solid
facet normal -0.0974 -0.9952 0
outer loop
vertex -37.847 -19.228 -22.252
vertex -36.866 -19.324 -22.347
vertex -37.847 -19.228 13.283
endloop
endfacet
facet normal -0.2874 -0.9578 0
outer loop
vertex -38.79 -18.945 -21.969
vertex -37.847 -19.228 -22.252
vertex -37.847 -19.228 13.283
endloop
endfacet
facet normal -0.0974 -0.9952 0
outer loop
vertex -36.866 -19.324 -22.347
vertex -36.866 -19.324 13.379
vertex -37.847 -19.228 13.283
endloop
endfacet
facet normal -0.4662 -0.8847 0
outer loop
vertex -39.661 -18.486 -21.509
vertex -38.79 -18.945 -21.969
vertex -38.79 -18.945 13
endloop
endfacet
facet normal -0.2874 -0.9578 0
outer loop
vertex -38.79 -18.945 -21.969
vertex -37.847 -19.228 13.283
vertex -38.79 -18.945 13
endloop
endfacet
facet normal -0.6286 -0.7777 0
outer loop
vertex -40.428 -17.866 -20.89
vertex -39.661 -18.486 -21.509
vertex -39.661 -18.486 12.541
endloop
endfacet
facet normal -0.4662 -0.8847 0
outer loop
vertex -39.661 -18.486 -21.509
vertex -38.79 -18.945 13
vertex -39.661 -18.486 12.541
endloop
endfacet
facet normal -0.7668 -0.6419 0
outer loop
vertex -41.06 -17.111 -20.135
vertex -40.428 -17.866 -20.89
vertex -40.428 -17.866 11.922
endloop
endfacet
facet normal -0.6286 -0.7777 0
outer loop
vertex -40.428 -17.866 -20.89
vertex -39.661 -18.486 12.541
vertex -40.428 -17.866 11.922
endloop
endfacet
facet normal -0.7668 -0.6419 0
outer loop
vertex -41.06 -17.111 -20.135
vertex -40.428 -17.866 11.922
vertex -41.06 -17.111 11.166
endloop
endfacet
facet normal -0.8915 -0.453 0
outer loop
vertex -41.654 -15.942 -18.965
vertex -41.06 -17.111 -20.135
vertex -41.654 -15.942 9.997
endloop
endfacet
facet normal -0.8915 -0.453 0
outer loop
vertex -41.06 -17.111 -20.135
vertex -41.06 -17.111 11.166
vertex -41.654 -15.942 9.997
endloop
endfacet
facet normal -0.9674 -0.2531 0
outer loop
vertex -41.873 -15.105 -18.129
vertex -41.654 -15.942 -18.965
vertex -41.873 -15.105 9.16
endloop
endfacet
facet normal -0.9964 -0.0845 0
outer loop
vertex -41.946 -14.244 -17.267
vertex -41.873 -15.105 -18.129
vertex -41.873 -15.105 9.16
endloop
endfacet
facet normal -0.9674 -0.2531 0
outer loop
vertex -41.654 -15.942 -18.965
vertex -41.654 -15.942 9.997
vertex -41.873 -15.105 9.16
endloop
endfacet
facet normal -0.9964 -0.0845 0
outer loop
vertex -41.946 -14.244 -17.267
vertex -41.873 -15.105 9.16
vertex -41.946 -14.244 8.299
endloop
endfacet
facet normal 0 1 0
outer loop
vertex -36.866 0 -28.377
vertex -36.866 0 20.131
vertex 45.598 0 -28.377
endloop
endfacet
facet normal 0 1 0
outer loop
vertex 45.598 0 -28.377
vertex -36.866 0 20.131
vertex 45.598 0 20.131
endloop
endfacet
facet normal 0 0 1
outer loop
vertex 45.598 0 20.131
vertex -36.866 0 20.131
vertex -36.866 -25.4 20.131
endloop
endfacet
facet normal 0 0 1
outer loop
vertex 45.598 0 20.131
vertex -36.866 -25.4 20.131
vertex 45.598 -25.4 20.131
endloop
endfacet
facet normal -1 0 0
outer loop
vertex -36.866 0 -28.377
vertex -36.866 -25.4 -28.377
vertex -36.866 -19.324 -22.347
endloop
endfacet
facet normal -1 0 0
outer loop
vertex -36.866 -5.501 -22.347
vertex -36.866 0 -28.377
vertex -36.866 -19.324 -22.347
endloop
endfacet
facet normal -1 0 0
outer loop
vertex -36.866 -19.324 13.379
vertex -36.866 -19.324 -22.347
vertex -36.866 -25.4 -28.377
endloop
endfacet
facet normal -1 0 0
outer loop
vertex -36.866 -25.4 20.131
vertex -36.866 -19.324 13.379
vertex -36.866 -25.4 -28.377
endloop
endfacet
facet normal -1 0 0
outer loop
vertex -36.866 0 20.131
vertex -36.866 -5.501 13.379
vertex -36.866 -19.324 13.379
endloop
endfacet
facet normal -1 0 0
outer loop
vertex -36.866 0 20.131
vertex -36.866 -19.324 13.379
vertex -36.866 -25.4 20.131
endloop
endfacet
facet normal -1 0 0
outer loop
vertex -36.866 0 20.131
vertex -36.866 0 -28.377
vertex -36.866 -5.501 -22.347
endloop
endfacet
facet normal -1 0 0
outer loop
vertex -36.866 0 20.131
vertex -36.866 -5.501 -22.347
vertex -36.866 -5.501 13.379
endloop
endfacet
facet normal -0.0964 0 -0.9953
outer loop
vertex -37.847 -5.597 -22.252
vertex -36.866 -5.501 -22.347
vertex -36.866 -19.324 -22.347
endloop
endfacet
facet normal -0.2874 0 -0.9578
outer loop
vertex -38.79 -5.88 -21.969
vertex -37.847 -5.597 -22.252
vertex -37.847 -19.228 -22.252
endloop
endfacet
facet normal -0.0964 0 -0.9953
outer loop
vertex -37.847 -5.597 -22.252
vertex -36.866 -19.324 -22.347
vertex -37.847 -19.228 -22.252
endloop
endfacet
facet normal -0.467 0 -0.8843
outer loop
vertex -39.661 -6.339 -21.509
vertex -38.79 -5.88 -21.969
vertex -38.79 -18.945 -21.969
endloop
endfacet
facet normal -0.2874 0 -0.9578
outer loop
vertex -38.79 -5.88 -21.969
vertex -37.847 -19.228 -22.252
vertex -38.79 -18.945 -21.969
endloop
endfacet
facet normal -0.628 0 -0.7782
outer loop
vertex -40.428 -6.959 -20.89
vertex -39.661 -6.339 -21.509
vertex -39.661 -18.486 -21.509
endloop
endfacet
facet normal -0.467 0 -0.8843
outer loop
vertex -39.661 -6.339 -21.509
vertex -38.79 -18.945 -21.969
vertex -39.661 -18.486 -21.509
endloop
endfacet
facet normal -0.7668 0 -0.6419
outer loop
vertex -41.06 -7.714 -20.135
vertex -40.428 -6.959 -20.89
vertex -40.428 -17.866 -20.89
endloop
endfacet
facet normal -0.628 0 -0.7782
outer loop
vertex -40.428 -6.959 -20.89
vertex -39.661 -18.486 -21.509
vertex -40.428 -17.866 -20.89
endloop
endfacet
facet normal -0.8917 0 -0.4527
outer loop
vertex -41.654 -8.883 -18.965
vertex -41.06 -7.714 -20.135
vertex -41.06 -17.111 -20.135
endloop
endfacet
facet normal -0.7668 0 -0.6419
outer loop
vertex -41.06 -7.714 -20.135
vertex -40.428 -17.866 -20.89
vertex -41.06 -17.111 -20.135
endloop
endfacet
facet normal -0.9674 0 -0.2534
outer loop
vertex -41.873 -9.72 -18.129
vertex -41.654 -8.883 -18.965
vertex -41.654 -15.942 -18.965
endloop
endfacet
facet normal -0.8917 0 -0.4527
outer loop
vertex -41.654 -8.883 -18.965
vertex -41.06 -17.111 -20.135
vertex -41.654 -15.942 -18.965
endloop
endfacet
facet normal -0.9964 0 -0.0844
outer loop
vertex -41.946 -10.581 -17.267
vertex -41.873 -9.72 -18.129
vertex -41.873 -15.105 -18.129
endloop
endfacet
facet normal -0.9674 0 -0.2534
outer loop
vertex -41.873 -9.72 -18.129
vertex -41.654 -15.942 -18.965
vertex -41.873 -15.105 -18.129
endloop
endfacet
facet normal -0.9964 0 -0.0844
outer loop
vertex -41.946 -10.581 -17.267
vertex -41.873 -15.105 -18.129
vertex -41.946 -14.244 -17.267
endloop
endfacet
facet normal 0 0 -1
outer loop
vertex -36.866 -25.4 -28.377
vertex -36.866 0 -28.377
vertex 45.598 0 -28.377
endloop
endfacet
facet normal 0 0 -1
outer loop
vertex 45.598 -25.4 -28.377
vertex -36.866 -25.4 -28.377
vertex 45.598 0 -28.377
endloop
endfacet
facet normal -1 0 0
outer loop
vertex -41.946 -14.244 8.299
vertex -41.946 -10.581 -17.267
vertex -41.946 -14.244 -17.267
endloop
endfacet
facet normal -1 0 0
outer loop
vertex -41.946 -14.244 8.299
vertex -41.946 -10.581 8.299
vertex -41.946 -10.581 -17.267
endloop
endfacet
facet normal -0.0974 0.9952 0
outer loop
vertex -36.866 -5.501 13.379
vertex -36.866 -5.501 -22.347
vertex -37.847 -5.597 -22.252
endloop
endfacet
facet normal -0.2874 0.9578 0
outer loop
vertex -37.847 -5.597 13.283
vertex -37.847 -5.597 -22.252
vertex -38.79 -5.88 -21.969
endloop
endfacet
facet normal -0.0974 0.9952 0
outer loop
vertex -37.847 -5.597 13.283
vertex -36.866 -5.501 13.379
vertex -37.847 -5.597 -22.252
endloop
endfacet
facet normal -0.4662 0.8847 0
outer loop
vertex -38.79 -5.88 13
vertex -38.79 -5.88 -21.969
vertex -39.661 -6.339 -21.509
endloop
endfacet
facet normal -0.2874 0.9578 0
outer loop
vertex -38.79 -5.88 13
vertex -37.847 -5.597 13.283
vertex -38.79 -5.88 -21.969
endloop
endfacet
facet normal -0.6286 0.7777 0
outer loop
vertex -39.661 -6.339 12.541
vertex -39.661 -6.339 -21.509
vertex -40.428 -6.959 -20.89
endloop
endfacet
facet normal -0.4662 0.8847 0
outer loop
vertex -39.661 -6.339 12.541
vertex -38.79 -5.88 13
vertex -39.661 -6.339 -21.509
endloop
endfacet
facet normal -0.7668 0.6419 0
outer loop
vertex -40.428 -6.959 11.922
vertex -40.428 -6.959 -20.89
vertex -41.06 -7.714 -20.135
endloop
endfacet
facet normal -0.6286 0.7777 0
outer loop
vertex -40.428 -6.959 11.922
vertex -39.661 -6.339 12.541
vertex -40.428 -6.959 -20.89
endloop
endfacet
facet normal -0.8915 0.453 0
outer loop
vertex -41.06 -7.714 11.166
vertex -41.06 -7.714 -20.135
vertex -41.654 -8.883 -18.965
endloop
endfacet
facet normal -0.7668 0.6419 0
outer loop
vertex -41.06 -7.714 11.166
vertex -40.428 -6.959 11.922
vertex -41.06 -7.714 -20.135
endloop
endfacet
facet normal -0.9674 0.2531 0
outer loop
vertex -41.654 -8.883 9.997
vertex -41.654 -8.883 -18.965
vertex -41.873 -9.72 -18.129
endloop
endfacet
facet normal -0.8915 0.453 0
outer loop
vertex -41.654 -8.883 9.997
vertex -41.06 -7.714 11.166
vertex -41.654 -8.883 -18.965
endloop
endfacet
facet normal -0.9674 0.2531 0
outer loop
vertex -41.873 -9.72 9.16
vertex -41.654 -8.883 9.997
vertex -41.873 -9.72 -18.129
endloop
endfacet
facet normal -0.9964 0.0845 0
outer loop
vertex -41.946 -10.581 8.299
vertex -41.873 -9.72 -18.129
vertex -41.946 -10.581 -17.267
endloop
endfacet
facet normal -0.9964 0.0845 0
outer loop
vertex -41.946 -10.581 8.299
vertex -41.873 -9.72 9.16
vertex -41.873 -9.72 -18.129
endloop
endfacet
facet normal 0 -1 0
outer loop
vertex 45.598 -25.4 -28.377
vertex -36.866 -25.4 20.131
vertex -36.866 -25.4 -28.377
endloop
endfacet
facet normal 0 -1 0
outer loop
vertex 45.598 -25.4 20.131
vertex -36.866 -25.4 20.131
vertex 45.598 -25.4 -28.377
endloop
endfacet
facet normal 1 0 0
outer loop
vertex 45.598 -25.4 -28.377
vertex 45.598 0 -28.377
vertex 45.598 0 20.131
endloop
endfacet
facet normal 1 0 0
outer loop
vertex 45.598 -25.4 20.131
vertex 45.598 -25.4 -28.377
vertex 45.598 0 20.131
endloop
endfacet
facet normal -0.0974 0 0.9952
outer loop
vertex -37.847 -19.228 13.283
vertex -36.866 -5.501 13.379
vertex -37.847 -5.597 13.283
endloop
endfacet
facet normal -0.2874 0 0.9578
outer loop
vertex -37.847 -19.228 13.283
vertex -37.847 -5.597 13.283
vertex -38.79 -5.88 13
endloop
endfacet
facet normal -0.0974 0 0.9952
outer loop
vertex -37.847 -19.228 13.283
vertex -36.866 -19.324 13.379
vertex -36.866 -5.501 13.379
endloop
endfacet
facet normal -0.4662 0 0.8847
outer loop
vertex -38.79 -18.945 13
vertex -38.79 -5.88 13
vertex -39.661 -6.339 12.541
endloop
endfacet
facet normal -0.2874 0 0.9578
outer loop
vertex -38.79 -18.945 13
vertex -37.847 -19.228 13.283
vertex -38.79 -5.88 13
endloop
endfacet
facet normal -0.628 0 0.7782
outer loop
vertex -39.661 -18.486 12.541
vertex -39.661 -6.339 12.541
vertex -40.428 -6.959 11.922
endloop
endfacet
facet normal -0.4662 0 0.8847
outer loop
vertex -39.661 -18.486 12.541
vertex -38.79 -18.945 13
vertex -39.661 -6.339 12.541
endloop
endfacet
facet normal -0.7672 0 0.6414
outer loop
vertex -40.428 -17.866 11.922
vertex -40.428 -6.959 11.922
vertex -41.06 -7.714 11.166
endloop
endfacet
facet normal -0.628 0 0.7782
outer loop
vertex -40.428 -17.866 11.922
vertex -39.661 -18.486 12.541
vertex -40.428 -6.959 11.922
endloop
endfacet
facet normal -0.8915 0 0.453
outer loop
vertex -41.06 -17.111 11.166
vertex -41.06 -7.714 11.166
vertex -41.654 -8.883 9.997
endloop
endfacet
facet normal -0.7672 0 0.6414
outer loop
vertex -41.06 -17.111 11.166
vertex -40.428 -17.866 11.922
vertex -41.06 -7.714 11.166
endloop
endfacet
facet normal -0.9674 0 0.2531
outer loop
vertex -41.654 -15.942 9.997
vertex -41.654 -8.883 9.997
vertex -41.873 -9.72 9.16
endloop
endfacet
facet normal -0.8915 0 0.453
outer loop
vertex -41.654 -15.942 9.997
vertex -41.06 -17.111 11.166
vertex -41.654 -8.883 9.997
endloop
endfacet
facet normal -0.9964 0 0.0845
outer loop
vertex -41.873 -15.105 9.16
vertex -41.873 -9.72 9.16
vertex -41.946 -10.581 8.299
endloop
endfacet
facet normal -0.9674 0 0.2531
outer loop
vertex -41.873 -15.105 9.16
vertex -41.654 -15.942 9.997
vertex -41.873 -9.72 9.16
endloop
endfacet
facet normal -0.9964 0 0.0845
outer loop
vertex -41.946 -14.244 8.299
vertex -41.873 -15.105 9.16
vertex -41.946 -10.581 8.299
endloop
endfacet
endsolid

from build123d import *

# Parameters (mm, degrees)
F0_W     = 82.4639983475
F0_H     = 48.5082380474
F1_DEPTH = 25.4
F2_W     = 13.8226579875
F2_H     = 35.7262613252
F3_DEPTH = 5.08
F4_R     = 5.07999


# Not quite as in the source:
# - a fillet or chamfer is up to 0.001 mm smaller than in the source, because OpenCascade refuses the exact size


with BuildPart() as f1:
    # F0 (on Front) → F1 (new body)
    with BuildSketch(Plane.XZ):
        with Locations((4.3657366186, -4.1232034564)):
            Rectangle(F0_W, F0_H)
    extrude(amount=F1_DEPTH)

    # F2 (on face) → F3 (join)
    with BuildSketch(Plane(origin=(-36.8662625551, 0, 0), x_dir=(0, -1, 0), z_dir=(-1, 0, 0))):
        with Locations((12.4125434086, -4.4842208736)):
            Rectangle(F2_W, F2_H)
    extrude(amount=F3_DEPTH)

    # F4 (radius 5.08 in the source; OpenCascade refuses exactly that, so slightly less here)
    f4_edges = [f1.edges().sort_by_distance(p)[0] for p in [
        (-41.946263, -12.412543, -22.347352),
        (-41.946263, -5.501214, -4.484221),
        (-41.946263, -19.323872, -4.484221),
        (-41.946263, -12.412543, 13.37891),
    ]]
    fillet(f4_edges, radius=F4_R)


solid = f1.part
